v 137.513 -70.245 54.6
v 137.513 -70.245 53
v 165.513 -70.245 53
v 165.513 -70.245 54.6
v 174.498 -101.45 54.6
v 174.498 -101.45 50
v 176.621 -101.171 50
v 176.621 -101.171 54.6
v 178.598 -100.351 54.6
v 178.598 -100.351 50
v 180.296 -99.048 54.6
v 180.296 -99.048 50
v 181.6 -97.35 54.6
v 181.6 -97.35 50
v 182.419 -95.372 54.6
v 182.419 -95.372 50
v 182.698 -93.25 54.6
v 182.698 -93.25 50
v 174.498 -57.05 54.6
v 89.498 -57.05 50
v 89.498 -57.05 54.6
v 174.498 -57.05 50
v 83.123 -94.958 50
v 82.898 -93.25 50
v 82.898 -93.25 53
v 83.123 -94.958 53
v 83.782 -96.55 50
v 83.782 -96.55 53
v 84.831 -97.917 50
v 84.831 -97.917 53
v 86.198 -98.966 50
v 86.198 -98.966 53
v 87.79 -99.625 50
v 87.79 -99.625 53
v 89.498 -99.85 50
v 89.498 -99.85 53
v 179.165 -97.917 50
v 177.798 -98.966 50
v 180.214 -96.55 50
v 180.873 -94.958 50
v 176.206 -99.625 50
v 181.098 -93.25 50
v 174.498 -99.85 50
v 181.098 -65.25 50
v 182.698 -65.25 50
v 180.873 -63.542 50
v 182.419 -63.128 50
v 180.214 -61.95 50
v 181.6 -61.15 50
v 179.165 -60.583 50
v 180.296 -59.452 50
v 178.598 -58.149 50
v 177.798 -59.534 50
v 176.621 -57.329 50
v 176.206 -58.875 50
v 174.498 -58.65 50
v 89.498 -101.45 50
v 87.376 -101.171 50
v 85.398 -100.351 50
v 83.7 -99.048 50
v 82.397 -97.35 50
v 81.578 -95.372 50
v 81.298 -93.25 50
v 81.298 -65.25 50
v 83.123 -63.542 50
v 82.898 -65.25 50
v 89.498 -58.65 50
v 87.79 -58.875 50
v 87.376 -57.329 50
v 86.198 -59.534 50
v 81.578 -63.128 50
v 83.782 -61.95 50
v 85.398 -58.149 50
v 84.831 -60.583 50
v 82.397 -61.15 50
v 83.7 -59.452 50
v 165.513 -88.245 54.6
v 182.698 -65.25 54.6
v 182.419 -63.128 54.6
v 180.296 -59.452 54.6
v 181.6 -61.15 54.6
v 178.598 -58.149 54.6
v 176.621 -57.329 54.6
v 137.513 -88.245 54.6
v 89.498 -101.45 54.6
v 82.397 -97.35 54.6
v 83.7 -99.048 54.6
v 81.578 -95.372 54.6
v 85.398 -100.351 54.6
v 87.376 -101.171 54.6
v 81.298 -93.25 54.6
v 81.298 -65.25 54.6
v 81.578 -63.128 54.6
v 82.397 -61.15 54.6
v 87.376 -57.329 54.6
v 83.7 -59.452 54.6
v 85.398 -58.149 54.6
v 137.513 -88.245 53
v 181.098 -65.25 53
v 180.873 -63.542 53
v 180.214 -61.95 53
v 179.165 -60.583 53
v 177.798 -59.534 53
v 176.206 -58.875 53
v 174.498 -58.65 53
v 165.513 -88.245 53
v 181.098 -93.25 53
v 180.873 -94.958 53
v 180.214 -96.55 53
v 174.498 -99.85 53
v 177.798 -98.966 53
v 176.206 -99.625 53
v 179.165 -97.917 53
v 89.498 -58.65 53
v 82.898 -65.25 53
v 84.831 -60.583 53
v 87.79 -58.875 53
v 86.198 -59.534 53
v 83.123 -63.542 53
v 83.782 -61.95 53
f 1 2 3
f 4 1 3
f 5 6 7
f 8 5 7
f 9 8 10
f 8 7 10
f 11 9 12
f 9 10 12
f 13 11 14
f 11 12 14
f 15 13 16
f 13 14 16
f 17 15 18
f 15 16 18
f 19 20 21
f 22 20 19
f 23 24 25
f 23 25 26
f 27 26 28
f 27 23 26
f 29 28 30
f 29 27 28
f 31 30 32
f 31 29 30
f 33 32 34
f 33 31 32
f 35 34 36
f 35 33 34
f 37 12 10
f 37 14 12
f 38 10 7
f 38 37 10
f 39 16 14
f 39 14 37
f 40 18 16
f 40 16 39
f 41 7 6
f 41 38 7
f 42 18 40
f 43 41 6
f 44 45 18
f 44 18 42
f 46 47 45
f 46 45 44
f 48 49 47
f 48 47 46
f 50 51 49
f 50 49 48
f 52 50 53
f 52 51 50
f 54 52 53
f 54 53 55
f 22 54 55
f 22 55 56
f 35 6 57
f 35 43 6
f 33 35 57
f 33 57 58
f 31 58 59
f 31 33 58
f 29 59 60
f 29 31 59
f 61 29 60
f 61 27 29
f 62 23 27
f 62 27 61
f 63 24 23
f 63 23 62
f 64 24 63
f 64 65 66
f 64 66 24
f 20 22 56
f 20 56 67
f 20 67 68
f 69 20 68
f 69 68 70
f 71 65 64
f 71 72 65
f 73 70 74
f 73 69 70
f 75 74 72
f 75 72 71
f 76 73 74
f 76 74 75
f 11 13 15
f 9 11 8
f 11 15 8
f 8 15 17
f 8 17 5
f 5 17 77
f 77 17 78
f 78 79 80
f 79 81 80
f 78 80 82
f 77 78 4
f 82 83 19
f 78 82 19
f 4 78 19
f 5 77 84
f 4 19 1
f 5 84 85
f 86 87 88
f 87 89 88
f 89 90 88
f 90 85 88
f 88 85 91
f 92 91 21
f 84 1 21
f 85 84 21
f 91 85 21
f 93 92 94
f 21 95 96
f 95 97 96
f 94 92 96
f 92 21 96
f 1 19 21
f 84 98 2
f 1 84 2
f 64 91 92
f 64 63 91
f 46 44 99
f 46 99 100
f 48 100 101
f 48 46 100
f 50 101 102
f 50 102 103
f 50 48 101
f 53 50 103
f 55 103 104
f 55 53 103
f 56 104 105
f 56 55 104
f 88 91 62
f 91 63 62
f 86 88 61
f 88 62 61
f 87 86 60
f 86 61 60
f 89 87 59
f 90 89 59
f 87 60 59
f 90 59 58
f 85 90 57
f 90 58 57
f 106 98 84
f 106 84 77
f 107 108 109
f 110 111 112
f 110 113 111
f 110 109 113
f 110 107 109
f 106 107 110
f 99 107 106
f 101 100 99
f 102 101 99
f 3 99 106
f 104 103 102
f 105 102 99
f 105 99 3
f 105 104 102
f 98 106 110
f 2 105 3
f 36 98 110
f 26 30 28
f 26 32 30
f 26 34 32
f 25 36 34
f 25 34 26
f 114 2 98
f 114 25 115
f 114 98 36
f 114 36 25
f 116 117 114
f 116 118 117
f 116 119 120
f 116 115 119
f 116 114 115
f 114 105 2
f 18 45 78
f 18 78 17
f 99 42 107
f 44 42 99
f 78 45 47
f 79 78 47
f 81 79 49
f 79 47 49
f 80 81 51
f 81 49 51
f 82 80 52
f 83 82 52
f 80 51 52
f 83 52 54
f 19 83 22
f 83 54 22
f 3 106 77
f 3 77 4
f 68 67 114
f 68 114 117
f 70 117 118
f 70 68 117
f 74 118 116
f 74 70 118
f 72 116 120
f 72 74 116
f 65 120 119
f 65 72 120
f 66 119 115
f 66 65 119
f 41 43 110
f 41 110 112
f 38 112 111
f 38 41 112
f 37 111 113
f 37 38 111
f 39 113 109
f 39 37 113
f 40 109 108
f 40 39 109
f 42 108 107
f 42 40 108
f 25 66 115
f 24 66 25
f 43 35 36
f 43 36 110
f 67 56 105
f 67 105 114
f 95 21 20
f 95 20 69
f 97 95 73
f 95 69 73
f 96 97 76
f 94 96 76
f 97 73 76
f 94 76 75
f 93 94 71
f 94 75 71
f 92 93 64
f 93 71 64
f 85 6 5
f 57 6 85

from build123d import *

# Parameters (mm, degrees)
SKETCH004_W      = 28
SKETCH004_H      = 18
EXTRUDE004_DEPTH = 1.6
EXTRUDE003_DEPTH = 3


with BuildPart() as dekseltop:
    # Sketch004 → Extrude004 (new body)
    with BuildSketch(Plane.XY):
        with BuildLine():
            Line((89.498192, -57.050084), (174.498192, -57.050084))
            ThreePointArc((182.698192, -65.250084), (180.296468, -59.451808), (174.498192, -57.050084))
            Line((182.698192, -65.250084), (182.698192, -93.250084))
            ThreePointArc((174.498192, -101.450084), (180.296468, -99.04836), (182.698192, -93.250084))
            Line((174.498192, -101.450084), (89.498192, -101.450084))
            ThreePointArc((81.298192, -93.250084), (83.699916, -99.04836), (89.498192, -101.450084))
            Line((81.298192, -93.250084), (81.298192, -65.250084))
            ThreePointArc((89.498192, -57.050084), (83.699916, -59.451808), (81.298192, -65.250084))
        make_face()
        with Locations((151.513474, -79.24515)):
            Rectangle(SKETCH004_W, SKETCH004_H, mode=Mode.SUBTRACT)
    extrude(amount=EXTRUDE004_DEPTH)


with BuildPart() as dekseltop_1:
    # Extrude004 placement: moved
    add(dekseltop.part.moved(Location((0, 0, 53))))


with BuildPart() as deksel:
    # Sketch003 → Extrude003 (new body)
    with BuildSketch(Plane.XY):
        with BuildLine():
            Line((89.498192, -57.050084), (174.498192, -57.050084))
            ThreePointArc((182.698192, -65.250084), (180.296468, -59.451808), (174.498192, -57.050084))
            Line((182.698192, -65.250084), (182.698192, -93.250084))
            ThreePointArc((174.498192, -101.450084), (180.296468, -99.04836), (182.698192, -93.250084))
            Line((174.498192, -101.450084), (89.498192, -101.450084))
            ThreePointArc((81.298192, -93.250084), (83.699916, -99.04836), (89.498192, -101.450084))
            Line((81.298192, -93.250084), (81.298192, -65.250084))
            ThreePointArc((89.498192, -57.050084), (83.699916, -59.451808), (81.298192, -65.250084))
        make_face()
        with BuildLine():
            Line((89.498192, -99.850084), (174.498192, -99.850084))
            ThreePointArc((174.498192, -99.850084), (179.165097, -97.916989), (181.098192, -93.250084))
            Line((181.098192, -93.250084), (181.098192, -65.250084))
            ThreePointArc((181.098192, -65.250084), (179.165097, -60.583179), (174.498192, -58.650084))
            Line((174.498192, -58.650084), (89.498192, -58.650084))
            ThreePointArc((89.498192, -58.650084), (84.831287, -60.583179), (82.898192, -65.250084))
            Line((82.898192, -65.250084), (82.898192, -93.250084))
            ThreePointArc((82.898192, -93.250084), (84.831287, -97.916989), (89.498192, -99.850084))
        make_face(mode=Mode.SUBTRACT)
    extrude(amount=EXTRUDE003_DEPTH)


with BuildPart() as deksel_1:
    # Extrude003 placement: moved
    add(deksel.part.moved(Location((0, 0, 50))))

    # Fusion001: union DekselTop
    add(dekseltop_1.part)


solid = deksel_1.part
